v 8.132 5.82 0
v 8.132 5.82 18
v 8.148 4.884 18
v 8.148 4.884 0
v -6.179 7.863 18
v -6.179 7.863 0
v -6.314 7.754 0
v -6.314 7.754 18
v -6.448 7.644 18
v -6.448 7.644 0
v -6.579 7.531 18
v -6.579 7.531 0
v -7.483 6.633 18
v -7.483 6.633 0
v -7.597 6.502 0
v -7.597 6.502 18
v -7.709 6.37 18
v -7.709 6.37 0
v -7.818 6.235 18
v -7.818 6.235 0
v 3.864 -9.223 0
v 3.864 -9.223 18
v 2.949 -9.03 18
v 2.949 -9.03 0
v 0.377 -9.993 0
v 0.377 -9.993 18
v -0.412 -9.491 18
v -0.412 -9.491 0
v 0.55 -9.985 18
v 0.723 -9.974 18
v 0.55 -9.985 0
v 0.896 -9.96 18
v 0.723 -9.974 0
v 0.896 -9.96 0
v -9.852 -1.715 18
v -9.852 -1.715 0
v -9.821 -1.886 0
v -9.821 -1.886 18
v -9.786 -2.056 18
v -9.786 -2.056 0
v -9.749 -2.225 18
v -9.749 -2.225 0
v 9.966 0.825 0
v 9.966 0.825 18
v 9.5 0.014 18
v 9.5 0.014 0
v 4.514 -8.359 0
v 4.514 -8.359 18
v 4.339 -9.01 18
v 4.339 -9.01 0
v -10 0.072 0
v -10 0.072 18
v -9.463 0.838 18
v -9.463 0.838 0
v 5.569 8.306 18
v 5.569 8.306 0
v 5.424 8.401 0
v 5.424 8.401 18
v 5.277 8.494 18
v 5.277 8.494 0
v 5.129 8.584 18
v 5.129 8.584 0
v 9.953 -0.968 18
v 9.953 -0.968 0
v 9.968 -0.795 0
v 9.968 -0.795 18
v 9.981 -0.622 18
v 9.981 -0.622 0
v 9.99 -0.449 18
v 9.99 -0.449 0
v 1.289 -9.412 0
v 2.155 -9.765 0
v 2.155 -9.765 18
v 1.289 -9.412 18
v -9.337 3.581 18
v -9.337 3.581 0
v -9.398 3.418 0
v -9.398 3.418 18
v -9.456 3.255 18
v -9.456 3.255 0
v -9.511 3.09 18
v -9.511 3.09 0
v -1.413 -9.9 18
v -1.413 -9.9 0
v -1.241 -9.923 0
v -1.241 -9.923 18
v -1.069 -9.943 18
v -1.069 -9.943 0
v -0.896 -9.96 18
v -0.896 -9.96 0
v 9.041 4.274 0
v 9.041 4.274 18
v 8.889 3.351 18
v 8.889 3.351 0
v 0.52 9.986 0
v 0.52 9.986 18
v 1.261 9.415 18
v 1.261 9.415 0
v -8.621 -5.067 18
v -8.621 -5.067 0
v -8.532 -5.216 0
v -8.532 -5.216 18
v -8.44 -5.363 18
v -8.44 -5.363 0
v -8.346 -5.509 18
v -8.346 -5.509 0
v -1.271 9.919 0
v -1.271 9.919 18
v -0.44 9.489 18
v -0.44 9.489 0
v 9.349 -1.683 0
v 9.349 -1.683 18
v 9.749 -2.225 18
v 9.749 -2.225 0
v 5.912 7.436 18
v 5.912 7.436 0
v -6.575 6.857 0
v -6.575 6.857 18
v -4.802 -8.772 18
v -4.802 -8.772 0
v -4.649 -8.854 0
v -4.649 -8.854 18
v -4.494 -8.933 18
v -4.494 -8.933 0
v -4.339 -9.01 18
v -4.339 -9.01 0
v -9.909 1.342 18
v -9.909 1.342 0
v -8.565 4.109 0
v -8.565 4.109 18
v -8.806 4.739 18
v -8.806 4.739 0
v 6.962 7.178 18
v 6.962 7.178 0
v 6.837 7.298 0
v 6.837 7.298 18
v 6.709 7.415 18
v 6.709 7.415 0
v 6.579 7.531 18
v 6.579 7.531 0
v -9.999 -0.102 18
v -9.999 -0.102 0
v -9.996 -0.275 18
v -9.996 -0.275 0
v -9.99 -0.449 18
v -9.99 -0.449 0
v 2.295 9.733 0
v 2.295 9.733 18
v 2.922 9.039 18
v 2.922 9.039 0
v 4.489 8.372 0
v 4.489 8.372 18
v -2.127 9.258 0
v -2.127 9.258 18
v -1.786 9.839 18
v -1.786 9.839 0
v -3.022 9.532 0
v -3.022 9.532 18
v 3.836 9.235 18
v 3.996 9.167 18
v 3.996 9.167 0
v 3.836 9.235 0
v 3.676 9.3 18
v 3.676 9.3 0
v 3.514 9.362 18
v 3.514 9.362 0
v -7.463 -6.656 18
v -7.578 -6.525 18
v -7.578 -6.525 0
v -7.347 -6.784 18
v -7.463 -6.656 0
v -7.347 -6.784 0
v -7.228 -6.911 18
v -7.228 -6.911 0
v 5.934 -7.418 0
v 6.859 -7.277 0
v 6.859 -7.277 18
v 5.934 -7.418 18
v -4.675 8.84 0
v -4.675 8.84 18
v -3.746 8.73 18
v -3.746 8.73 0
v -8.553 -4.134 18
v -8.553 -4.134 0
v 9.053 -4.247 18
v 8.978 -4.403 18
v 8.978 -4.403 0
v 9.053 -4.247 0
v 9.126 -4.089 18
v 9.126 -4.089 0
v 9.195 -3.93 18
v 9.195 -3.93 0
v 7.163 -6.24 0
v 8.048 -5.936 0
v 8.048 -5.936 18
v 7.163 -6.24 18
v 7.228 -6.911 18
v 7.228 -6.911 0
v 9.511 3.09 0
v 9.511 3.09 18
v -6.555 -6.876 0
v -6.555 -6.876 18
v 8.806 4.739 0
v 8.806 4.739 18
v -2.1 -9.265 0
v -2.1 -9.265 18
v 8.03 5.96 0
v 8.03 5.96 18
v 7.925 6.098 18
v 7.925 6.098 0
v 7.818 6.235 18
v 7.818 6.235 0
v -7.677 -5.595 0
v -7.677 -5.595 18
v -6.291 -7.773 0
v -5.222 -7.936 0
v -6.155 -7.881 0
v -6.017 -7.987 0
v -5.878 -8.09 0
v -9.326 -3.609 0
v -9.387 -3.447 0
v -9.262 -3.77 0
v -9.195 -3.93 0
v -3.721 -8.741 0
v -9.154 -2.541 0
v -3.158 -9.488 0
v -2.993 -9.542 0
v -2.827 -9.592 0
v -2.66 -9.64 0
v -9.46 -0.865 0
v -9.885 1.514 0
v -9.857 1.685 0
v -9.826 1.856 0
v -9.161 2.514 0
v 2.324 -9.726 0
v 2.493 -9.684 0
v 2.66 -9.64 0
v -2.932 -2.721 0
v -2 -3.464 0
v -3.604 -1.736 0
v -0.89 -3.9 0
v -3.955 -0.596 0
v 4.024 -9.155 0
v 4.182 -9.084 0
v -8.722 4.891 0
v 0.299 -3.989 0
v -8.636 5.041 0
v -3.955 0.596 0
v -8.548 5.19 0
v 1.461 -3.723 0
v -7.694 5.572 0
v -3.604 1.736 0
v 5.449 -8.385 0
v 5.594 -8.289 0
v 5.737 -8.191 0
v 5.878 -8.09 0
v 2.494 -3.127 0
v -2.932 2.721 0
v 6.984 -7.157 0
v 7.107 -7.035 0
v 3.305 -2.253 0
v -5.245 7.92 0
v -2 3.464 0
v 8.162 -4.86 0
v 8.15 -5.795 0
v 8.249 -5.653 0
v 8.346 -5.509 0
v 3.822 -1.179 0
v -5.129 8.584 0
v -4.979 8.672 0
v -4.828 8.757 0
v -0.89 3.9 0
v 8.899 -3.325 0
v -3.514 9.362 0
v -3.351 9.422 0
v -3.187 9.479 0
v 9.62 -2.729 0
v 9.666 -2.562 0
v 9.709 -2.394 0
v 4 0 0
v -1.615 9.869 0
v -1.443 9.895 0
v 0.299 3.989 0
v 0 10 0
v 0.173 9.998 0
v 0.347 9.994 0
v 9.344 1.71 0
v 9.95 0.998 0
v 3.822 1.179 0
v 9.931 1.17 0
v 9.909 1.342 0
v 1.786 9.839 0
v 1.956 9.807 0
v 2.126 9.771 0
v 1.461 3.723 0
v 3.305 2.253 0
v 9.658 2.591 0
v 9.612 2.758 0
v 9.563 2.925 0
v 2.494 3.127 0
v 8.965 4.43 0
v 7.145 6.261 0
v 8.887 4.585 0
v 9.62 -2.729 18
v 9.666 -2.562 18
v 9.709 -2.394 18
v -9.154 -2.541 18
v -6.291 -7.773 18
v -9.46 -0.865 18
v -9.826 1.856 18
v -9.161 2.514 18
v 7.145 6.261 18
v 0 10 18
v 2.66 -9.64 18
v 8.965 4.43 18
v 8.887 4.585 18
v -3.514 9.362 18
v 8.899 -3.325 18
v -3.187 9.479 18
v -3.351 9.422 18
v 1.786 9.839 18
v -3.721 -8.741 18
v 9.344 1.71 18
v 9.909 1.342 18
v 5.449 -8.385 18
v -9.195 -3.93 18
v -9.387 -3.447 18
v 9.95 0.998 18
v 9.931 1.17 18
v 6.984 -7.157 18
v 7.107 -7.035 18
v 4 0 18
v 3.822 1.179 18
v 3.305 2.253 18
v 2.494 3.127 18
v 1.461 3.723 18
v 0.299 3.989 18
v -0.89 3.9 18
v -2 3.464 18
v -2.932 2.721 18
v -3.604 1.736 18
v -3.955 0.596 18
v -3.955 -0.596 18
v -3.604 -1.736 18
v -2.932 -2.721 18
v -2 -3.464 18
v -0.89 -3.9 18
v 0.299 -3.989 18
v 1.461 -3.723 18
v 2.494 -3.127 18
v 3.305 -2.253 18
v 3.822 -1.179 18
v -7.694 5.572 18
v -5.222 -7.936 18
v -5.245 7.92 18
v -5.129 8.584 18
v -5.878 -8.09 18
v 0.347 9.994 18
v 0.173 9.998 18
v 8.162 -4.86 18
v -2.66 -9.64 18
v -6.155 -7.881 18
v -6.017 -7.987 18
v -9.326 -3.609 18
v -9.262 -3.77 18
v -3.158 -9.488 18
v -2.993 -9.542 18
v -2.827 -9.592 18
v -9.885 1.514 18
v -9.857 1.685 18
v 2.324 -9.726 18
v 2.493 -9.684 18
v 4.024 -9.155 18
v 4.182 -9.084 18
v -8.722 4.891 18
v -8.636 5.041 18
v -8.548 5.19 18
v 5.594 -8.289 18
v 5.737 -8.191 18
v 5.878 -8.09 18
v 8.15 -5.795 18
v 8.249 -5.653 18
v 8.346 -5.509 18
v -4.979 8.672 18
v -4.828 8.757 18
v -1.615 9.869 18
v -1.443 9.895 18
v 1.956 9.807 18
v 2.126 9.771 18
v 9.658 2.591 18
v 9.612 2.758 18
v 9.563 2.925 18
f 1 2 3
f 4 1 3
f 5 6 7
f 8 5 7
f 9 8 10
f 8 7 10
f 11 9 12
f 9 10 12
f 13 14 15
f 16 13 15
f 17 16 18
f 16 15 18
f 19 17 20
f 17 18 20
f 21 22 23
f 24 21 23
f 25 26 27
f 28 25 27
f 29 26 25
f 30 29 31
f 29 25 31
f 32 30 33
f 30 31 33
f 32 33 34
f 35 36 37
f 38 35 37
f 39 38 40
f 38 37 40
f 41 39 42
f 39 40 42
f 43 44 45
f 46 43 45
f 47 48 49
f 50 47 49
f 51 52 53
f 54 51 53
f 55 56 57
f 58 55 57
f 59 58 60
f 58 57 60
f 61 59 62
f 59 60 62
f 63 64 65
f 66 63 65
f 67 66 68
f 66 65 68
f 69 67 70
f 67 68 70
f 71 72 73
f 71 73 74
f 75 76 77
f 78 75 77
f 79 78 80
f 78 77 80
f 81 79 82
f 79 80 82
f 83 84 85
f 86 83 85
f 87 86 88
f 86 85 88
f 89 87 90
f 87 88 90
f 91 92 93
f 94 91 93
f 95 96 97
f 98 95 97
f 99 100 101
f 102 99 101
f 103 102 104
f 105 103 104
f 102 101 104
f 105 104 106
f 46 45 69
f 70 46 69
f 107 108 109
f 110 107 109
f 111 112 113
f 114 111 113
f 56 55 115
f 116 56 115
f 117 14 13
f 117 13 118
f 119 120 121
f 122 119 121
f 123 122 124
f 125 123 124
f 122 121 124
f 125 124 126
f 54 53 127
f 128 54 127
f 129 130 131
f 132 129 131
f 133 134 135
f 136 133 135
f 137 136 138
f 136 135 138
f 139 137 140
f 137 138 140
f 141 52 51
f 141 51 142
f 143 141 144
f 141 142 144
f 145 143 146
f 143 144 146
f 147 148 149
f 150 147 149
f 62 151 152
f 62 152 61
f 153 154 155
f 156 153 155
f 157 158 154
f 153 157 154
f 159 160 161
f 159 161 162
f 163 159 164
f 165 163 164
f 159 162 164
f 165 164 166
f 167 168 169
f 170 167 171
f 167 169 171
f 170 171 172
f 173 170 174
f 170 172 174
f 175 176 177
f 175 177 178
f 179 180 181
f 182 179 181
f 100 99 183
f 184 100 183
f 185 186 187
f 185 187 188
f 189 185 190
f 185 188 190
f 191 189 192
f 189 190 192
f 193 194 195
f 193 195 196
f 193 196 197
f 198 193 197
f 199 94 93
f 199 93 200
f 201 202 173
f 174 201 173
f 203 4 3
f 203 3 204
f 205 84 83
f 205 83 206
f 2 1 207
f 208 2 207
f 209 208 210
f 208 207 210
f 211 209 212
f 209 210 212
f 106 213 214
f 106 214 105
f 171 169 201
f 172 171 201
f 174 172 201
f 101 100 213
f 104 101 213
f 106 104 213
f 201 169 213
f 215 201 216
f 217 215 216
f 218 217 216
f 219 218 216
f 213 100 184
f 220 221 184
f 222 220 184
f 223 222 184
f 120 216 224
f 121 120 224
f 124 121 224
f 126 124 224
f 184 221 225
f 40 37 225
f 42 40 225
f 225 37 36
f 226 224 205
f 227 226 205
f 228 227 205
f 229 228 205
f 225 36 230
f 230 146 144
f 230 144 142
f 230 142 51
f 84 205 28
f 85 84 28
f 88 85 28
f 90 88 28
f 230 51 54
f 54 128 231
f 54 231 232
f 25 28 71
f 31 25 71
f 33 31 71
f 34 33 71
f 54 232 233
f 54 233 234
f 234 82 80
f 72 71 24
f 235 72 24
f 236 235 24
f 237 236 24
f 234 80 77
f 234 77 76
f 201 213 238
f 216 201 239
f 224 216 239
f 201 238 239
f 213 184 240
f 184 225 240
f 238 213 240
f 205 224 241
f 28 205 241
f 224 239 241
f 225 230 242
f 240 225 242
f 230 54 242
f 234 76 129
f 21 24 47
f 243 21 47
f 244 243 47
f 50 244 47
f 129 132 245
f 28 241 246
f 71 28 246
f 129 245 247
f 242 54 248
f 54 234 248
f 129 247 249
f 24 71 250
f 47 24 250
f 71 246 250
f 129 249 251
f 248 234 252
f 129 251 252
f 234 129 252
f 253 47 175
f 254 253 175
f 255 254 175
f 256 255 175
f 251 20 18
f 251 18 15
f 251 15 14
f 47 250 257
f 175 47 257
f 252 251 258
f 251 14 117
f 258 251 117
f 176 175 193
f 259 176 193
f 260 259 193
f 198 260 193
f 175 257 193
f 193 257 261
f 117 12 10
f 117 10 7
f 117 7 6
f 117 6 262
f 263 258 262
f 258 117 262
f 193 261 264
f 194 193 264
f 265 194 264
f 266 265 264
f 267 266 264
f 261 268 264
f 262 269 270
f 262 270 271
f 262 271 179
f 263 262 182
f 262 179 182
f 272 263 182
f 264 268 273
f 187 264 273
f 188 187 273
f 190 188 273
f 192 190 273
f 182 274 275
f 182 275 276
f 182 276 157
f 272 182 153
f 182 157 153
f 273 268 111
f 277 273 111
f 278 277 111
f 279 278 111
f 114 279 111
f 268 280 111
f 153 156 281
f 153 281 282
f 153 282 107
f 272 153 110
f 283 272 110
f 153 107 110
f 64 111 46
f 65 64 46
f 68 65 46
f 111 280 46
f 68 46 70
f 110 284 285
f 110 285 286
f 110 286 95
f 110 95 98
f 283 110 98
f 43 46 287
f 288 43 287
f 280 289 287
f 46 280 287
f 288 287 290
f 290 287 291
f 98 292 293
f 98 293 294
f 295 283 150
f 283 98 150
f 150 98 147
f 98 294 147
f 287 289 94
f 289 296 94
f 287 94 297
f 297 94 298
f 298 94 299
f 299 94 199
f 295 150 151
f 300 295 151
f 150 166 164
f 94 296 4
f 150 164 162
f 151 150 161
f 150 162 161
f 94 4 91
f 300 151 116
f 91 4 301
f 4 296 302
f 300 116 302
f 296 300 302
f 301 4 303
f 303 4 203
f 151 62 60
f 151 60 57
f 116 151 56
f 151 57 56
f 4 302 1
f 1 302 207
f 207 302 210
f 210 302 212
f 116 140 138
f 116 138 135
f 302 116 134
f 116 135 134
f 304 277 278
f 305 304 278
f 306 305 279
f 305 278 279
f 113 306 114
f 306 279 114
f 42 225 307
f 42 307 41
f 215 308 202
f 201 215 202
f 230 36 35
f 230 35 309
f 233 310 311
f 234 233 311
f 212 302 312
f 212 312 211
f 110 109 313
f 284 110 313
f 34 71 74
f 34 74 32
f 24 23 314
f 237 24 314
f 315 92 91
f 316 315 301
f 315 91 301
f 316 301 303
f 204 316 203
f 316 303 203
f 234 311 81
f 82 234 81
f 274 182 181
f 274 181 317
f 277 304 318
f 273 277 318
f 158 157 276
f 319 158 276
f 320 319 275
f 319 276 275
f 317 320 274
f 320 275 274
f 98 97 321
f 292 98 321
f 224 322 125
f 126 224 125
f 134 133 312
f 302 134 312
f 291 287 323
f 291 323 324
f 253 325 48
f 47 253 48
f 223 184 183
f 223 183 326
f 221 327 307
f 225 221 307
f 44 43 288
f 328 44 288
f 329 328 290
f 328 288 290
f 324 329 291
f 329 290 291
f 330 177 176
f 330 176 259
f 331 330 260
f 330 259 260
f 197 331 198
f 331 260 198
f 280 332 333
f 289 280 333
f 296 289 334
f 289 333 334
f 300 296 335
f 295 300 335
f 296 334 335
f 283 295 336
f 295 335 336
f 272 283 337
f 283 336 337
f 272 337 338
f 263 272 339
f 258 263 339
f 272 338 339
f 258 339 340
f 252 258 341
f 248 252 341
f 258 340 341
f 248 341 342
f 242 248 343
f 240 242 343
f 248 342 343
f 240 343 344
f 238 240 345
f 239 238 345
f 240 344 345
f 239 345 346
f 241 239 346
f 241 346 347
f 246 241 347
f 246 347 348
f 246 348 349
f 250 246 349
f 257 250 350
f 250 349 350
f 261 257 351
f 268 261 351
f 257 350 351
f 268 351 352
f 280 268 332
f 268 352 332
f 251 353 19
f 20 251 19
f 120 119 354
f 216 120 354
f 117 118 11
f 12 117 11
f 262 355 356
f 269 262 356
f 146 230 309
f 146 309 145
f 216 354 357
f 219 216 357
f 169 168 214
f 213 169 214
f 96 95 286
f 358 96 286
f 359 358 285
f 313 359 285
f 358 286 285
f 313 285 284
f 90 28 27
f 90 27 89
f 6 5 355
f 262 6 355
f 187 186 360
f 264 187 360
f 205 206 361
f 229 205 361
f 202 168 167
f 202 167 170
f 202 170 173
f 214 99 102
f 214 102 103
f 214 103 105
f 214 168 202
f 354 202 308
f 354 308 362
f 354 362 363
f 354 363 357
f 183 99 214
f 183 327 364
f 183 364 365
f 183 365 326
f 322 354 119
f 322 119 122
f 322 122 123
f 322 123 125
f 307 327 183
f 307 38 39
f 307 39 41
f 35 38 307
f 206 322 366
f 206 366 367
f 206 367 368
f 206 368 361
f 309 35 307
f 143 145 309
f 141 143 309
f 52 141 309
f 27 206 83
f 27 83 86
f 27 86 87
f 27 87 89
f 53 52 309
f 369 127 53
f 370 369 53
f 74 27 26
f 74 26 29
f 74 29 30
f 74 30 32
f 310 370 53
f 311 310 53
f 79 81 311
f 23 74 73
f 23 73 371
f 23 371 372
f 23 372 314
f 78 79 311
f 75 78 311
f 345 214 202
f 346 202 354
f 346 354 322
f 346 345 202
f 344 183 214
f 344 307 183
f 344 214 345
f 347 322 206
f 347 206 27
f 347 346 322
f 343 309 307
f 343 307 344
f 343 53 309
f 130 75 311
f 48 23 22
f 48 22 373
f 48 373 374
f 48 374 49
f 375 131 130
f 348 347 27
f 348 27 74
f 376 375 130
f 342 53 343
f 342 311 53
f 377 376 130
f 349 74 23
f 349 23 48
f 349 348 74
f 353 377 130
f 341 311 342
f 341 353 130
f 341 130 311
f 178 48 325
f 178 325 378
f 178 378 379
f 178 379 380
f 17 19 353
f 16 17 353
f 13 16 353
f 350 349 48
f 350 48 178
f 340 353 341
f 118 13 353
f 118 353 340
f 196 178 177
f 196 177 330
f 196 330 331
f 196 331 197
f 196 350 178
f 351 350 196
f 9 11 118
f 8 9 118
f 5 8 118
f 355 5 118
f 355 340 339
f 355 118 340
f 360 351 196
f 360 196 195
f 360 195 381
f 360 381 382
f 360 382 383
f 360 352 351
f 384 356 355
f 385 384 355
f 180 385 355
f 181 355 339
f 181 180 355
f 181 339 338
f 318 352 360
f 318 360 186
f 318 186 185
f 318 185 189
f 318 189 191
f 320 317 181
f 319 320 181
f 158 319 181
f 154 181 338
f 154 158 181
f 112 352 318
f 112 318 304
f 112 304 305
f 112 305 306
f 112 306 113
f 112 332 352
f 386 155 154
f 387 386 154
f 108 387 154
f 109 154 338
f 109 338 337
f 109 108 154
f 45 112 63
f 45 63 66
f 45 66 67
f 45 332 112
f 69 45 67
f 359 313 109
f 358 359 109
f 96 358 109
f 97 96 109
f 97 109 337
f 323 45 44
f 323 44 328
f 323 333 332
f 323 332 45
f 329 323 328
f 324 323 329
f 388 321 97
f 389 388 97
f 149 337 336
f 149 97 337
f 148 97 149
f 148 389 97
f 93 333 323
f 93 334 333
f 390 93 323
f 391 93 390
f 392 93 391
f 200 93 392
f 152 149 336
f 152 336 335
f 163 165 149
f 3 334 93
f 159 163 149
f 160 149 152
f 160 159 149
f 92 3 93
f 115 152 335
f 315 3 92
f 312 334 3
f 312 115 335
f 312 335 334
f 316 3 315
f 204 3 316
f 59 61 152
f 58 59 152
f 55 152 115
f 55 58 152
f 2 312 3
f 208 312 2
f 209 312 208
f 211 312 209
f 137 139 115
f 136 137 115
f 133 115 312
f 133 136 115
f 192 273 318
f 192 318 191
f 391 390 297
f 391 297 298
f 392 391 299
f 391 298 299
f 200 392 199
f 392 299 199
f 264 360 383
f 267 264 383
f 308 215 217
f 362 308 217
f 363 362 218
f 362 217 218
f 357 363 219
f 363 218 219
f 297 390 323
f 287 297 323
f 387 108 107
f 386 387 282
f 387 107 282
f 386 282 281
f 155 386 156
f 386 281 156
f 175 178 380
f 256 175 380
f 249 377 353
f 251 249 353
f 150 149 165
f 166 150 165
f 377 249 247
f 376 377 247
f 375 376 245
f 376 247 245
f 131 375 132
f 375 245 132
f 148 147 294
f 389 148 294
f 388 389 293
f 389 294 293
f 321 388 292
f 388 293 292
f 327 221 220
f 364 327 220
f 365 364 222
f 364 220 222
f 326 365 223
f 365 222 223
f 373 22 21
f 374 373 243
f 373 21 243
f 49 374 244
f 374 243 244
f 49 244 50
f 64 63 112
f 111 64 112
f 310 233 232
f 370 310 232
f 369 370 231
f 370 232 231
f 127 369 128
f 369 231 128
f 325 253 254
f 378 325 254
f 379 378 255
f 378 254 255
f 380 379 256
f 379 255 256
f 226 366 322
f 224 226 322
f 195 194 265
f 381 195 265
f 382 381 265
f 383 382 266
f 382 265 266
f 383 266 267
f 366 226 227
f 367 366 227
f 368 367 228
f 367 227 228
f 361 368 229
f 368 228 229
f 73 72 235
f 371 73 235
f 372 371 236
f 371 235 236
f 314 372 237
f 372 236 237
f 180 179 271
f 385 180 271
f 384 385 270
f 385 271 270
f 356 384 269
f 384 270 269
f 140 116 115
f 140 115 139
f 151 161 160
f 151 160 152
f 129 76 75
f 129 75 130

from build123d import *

# Parameters (mm, degrees)
SKETCH_1_R          = 10
EXTRUDE_1_DEPTH     = 18
CUT_EXTRUDE_1_DEPTH = 18
SKETCH_3_R          = 4
CUT_EXTRUDE_2_DEPTH = 18


with BuildPart() as part:
    # 스케치1 → 보스-돌출1 (new body)
    with BuildSketch(Plane.XY):
        Circle(SKETCH_1_R)
    extrude(amount=EXTRUDE_1_DEPTH)

    # 스케치2 → 컷-돌출1 (cut)
    with BuildSketch(Plane.XY.offset(18)):
        with BuildLine():
            Line((-1.271266061, 9.918864986), (-0.440085126, 9.489416934))
            Line((-0.440085126, 9.489416934), (0, 10))
            ThreePointArc((0, 10), (-0.652192749, 10.218898871), (-1.271266061, 9.918864986))
        make_face()
        with BuildLine():
            Line((0.52024544, 9.986458065), (1.261388044, 9.415498333))
            Line((1.261388044, 9.415498333), (1.785568948, 9.839295886))
            ThreePointArc((1.785568948, 9.839295886), (1.182943108, 10.171130474), (0.52024544, 9.986458065))
        make_face()
        with BuildLine():
            Line((2.295035824, 9.733078165), (2.922319165, 9.038957869))
            Line((2.922319165, 9.038957869), (3.513748241, 9.362348706))
            ThreePointArc((3.513748241, 9.362348706), (2.980058199, 9.796453575), (2.295035824, 9.733078165))
        make_face()
        with BuildLine():
            Line((3.996061868, 9.166869125), (4.489324543, 8.371897862))
            Line((4.489324543, 8.371897862), (5.128992774, 8.584487936))
            ThreePointArc((5.128992774, 8.584487936), (4.681391768, 9.106910598), (3.996061868, 9.166869125))
        make_face()
        with BuildLine():
            Line((5.568651195, 8.306029368), (5.912039336, 7.435758169))
            Line((5.912039336, 7.435758169), (6.579387259, 7.53071466))
            ThreePointArc((6.579387259, 7.53071466), (6.232261554, 8.12466402), (5.568651195, 8.306029368))
        make_face()
        with BuildLine():
            Line((6.962259492, 7.178226993), (7.144736321, 6.26062709))
            Line((7.144736321, 6.26062709), (7.818314825, 6.234898019))
            ThreePointArc((7.818314825, 6.234898019), (7.582821326, 6.881284056), (6.962259492, 7.178226993))
        make_face()
        with BuildLine():
            Line((8.13209504, 5.819710497), (8.147795602, 4.884274306))
            Line((8.147795602, 4.884274306), (8.805955319, 4.738686625))
            ThreePointArc((8.805955319, 4.738686625), (8.689662981, 5.416733961), (8.13209504, 5.819710497))
        make_face()
        with BuildLine():
            Line((9.040558362, 4.274143716), (8.888978028, 3.350936926))
            Line((8.888978028, 3.350936926), (9.510565163, 3.090169944))
            ThreePointArc((9.510565163, 3.090169944), (9.517211718, 3.778085579), (9.040558362, 4.274143716))
        make_face()
        with BuildLine():
            Line((9.658450699, 2.59120244), (9.344461386, 1.709897677))
            Line((9.344461386, 1.709897677), (9.909497618, 1.342332658))
            ThreePointArc((9.909497618, 1.342332658), (10.038869439, 2.018006418), (9.658450699, 2.59120244))
        make_face()
        with BuildLine():
            Line((9.965912485, 0.824977785), (9.499606067, 0.013900909))
            Line((9.499606067, 0.013900909), (9.989930665, -0.448648304))
            ThreePointArc((9.989930665, -0.448648304), (10.237869637, 0.19306687), (9.965912485, 0.824977785))
        make_face()
        with BuildLine():
            Line((9.953061643, -0.967762334), (9.349425592, -1.682542646))
            Line((9.349425592, -1.682542646), (9.749279122, -2.22520934))
            ThreePointArc((9.749279122, -2.22520934), (10.107816281, -1.638078006), (9.953061643, -0.967762334))
        make_face()
        with BuildLine():
            Line((9.62031121, -2.729397776), (8.898746887, -3.324907895))
            Line((8.898746887, -3.324907895), (9.195277726, -3.930250317))
            ThreePointArc((9.195277726, -3.930250317), (9.652889393, -3.416573707), (9.62031121, -2.729397776))
        make_face()
        with BuildLine():
            Line((8.97835606, -4.403308127), (8.162055134, -4.860407869))
            Line((8.162055134, -4.860407869), (8.345732537, -5.508969815))
            ThreePointArc((8.345732537, -5.508969815), (8.887710697, -5.085257917), (8.97835606, -4.403308127))
        make_face()
        with BuildLine():
            Line((8.047829158, -5.935692533), (7.163028213, -6.239690335))
            Line((7.163028213, -6.239690335), (7.227948638, -6.91062649))
            ThreePointArc((7.227948638, -6.91062649), (7.836873667, -6.590497754), (8.047829158, -5.935692533))
        make_face()
        with BuildLine():
            Line((6.858638405, -7.277298896), (5.933775673, -7.418424019))
            Line((5.933775673, -7.418424019), (5.877852523, -8.090169944))
            ThreePointArc((5.877852523, -8.090169944), (6.534153069, -7.883913571), (6.858638405, -7.277298896))
        make_face()
        with BuildLine():
            Line((5.449005371, -8.385006885), (4.513806699, -8.358723452))
            Line((4.513806699, -8.358723452), (4.338837391, -9.009688679))
            ThreePointArc((4.338837391, -9.009688679), (5.021419415, -8.923933919), (5.449005371, -8.385006885))
        make_face()
        with BuildLine():
            Line((3.864236821, -9.223213854), (2.948760264, -9.030366635))
            Line((2.948760264, -9.030366635), (2.660368456, -9.639628607))
            ThreePointArc((2.660368456, -9.639628607), (3.347293209, -9.677131687), (3.864236821, -9.223213854))
        make_face()
        with BuildLine():
            Line((2.15526852, -9.76497914), (1.288938249, -9.411766404))
            Line((1.288938249, -9.411766404), (0.896393089, -9.95974294))
            ThreePointArc((0.896393089, -9.95974294), (1.565582245, -10.119298481), (2.15526852, -9.76497914))
        make_face()
        with BuildLine():
            Line((0.377028115, -9.992889962), (-0.412311303, -9.490664258))
            Line((-0.412311303, -9.490664258), (-0.896393089, -9.95974294))
            ThreePointArc((-0.896393089, -9.95974294), (-0.26644782, -10.236222696), (0.377028115, -9.992889962))
        make_face()
        with BuildLine():
            Line((-1.413330284, -9.899621079), (-2.10030883, -9.264524353))
            Line((-2.10030883, -9.264524353), (-2.660368456, -9.639628607))
            ThreePointArc((-2.660368456, -9.639628607), (-2.089914033, -10.024146291), (-1.413330284, -9.899621079))
        make_face()
        with BuildLine():
            Line((-3.158263084, -9.488170229), (-3.720800703, -8.740615012))
            Line((-3.720800703, -8.740615012), (-4.338837391, -9.009688679))
            ThreePointArc((-4.338837391, -9.009688679), (-3.846208689, -9.489885576), (-3.158263084, -9.488170229))
        make_face()
        with BuildLine():
            Line((-4.801686711, -8.77176178), (-5.221702981, -7.935775113))
            Line((-5.221702981, -7.935775113), (-5.877852523, -8.090169944))
            ThreePointArc((-5.877852523, -8.090169944), (-5.478883034, -8.65061213), (-4.801686711, -8.77176178))
        make_face()
        with BuildLine():
            Line((-6.290780175, -7.773421691), (-6.554775427, -6.875872872))
            Line((-6.554775427, -6.875872872), (-7.227948638, -6.91062649))
            ThreePointArc((-7.227948638, -6.91062649), (-6.935461569, -7.533300893), (-6.290780175, -7.773421691))
        make_face()
        with BuildLine():
            Line((-7.577682789, -6.525237433), (-7.677171999, -5.59497442))
            Line((-7.677171999, -5.59497442), (-8.345732537, -5.508969815))
            ThreePointArc((-8.345732537, -5.508969815), (-8.169128664, -6.173863166), (-7.577682789, -6.525237433))
        make_face()
        with BuildLine():
            Line((-8.621032443, -5.067326674), (-8.552817945, -4.134248887))
            Line((-8.552817945, -4.134248887), (-9.195277726, -3.930250317))
            ThreePointArc((-9.195277726, -3.930250317), (-9.140233241, -4.615992398), (-8.621032443, -5.067326674))
        make_face()
        with BuildLine():
            Line((-9.387295021, -3.446547867), (-9.153569286, -2.540645192))
            Line((-9.153569286, -2.540645192), (-9.749279122, -2.22520934))
            ThreePointArc((-9.749279122, -2.22520934), (-9.817563202, -2.909759836), (-9.387295021, -3.446547867))
        make_face()
        with BuildLine():
            Line((-9.851842212, -1.714994175), (-9.460117378, -0.865383071))
            Line((-9.460117378, -0.865383071), (-9.989930665, -0.448648304))
            ThreePointArc((-9.989930665, -0.448648304), (-10.179348603, -1.110005198), (-9.851842212, -1.714994175))
        make_face()
        with BuildLine():
            Line((-9.99974309, 0.07168084), (-9.462609514, 0.837693175))
            Line((-9.462609514, 0.837693175), (-9.909497618, 1.342332658))
            ThreePointArc((-9.909497618, 1.342332658), (-10.213961365, 0.725425919), (-9.99974309, 0.07168084))
        make_face()
        with BuildLine():
            Line((-9.826243996, 1.856051975), (-9.160965594, 2.513845272))
            Line((-9.160965594, 2.513845272), (-9.510565163, 3.090169944))
            ThreePointArc((-9.510565163, 3.090169944), (-9.920289004, 2.537541251), (-9.826243996, 1.856051975))
        make_face()
        with BuildLine():
            Line((-9.336921335, 3.580768071), (-8.564880702, 4.109200314))
            Line((-8.564880702, 4.109200314), (-8.805955319, 4.738686625))
            ThreePointArc((-8.805955319, 4.738686625), (-9.307770392, 4.268097919), (-9.336921335, 3.580768071))
        make_face()
        with BuildLine():
            Line((-8.54750234, 5.190395336), (-7.693513497, 5.572482277))
            Line((-7.693513497, 5.572482277), (-7.818314825, 6.234898019))
            ThreePointArc((-7.818314825, 6.234898019), (-8.396092381, 5.861474409), (-8.54750234, 5.190395336))
        make_face()
        with BuildLine():
            Line((-7.483359587, 6.633199024), (-6.574870438, 6.856660075))
            Line((-6.574870438, 6.856660075), (-6.579387259, 7.53071466))
            ThreePointArc((-6.579387259, 7.53071466), (-7.214557053, 7.266458288), (-7.483359587, 6.633199024))
        make_face()
        with BuildLine():
            Line((-6.1786955, 7.862806237), (-5.244905634, 7.920459176))
            Line((-5.244905634, 7.920459176), (-5.128992774, 8.584487936))
            ThreePointArc((-5.128992774, 8.584487936), (-5.801139925, 8.437892218), (-6.1786955, 7.862806237))
        make_face()
        with BuildLine():
            Line((-4.675443055, 8.839696388), (-3.746365247, 8.729688202))
            Line((-3.746365247, 8.729688202), (-3.513748241, 9.362348706))
            ThreePointArc((-3.513748241, 9.362348706), (-4.201269387, 9.33812535), (-4.675443055, 8.839696388))
        make_face()
        with BuildLine():
            Line((-3.021918024, 9.532471424), (-2.127413598, 9.258337866))
            Line((-2.127413598, 9.258337866), (-1.785568948, 9.839295886))
            ThreePointArc((-1.785568948, 9.839295886), (-2.466366594, 9.93822345), (-3.021918024, 9.532471424))
        make_face()
    extrude(amount=-CUT_EXTRUDE_1_DEPTH, mode=Mode.SUBTRACT)

    # 스케치3 → 컷-돌출2 (cut)
    with BuildSketch(Plane.XY.offset(18)):
        Circle(SKETCH_3_R)
    extrude(amount=-CUT_EXTRUDE_2_DEPTH, mode=Mode.SUBTRACT)


solid = part.part
